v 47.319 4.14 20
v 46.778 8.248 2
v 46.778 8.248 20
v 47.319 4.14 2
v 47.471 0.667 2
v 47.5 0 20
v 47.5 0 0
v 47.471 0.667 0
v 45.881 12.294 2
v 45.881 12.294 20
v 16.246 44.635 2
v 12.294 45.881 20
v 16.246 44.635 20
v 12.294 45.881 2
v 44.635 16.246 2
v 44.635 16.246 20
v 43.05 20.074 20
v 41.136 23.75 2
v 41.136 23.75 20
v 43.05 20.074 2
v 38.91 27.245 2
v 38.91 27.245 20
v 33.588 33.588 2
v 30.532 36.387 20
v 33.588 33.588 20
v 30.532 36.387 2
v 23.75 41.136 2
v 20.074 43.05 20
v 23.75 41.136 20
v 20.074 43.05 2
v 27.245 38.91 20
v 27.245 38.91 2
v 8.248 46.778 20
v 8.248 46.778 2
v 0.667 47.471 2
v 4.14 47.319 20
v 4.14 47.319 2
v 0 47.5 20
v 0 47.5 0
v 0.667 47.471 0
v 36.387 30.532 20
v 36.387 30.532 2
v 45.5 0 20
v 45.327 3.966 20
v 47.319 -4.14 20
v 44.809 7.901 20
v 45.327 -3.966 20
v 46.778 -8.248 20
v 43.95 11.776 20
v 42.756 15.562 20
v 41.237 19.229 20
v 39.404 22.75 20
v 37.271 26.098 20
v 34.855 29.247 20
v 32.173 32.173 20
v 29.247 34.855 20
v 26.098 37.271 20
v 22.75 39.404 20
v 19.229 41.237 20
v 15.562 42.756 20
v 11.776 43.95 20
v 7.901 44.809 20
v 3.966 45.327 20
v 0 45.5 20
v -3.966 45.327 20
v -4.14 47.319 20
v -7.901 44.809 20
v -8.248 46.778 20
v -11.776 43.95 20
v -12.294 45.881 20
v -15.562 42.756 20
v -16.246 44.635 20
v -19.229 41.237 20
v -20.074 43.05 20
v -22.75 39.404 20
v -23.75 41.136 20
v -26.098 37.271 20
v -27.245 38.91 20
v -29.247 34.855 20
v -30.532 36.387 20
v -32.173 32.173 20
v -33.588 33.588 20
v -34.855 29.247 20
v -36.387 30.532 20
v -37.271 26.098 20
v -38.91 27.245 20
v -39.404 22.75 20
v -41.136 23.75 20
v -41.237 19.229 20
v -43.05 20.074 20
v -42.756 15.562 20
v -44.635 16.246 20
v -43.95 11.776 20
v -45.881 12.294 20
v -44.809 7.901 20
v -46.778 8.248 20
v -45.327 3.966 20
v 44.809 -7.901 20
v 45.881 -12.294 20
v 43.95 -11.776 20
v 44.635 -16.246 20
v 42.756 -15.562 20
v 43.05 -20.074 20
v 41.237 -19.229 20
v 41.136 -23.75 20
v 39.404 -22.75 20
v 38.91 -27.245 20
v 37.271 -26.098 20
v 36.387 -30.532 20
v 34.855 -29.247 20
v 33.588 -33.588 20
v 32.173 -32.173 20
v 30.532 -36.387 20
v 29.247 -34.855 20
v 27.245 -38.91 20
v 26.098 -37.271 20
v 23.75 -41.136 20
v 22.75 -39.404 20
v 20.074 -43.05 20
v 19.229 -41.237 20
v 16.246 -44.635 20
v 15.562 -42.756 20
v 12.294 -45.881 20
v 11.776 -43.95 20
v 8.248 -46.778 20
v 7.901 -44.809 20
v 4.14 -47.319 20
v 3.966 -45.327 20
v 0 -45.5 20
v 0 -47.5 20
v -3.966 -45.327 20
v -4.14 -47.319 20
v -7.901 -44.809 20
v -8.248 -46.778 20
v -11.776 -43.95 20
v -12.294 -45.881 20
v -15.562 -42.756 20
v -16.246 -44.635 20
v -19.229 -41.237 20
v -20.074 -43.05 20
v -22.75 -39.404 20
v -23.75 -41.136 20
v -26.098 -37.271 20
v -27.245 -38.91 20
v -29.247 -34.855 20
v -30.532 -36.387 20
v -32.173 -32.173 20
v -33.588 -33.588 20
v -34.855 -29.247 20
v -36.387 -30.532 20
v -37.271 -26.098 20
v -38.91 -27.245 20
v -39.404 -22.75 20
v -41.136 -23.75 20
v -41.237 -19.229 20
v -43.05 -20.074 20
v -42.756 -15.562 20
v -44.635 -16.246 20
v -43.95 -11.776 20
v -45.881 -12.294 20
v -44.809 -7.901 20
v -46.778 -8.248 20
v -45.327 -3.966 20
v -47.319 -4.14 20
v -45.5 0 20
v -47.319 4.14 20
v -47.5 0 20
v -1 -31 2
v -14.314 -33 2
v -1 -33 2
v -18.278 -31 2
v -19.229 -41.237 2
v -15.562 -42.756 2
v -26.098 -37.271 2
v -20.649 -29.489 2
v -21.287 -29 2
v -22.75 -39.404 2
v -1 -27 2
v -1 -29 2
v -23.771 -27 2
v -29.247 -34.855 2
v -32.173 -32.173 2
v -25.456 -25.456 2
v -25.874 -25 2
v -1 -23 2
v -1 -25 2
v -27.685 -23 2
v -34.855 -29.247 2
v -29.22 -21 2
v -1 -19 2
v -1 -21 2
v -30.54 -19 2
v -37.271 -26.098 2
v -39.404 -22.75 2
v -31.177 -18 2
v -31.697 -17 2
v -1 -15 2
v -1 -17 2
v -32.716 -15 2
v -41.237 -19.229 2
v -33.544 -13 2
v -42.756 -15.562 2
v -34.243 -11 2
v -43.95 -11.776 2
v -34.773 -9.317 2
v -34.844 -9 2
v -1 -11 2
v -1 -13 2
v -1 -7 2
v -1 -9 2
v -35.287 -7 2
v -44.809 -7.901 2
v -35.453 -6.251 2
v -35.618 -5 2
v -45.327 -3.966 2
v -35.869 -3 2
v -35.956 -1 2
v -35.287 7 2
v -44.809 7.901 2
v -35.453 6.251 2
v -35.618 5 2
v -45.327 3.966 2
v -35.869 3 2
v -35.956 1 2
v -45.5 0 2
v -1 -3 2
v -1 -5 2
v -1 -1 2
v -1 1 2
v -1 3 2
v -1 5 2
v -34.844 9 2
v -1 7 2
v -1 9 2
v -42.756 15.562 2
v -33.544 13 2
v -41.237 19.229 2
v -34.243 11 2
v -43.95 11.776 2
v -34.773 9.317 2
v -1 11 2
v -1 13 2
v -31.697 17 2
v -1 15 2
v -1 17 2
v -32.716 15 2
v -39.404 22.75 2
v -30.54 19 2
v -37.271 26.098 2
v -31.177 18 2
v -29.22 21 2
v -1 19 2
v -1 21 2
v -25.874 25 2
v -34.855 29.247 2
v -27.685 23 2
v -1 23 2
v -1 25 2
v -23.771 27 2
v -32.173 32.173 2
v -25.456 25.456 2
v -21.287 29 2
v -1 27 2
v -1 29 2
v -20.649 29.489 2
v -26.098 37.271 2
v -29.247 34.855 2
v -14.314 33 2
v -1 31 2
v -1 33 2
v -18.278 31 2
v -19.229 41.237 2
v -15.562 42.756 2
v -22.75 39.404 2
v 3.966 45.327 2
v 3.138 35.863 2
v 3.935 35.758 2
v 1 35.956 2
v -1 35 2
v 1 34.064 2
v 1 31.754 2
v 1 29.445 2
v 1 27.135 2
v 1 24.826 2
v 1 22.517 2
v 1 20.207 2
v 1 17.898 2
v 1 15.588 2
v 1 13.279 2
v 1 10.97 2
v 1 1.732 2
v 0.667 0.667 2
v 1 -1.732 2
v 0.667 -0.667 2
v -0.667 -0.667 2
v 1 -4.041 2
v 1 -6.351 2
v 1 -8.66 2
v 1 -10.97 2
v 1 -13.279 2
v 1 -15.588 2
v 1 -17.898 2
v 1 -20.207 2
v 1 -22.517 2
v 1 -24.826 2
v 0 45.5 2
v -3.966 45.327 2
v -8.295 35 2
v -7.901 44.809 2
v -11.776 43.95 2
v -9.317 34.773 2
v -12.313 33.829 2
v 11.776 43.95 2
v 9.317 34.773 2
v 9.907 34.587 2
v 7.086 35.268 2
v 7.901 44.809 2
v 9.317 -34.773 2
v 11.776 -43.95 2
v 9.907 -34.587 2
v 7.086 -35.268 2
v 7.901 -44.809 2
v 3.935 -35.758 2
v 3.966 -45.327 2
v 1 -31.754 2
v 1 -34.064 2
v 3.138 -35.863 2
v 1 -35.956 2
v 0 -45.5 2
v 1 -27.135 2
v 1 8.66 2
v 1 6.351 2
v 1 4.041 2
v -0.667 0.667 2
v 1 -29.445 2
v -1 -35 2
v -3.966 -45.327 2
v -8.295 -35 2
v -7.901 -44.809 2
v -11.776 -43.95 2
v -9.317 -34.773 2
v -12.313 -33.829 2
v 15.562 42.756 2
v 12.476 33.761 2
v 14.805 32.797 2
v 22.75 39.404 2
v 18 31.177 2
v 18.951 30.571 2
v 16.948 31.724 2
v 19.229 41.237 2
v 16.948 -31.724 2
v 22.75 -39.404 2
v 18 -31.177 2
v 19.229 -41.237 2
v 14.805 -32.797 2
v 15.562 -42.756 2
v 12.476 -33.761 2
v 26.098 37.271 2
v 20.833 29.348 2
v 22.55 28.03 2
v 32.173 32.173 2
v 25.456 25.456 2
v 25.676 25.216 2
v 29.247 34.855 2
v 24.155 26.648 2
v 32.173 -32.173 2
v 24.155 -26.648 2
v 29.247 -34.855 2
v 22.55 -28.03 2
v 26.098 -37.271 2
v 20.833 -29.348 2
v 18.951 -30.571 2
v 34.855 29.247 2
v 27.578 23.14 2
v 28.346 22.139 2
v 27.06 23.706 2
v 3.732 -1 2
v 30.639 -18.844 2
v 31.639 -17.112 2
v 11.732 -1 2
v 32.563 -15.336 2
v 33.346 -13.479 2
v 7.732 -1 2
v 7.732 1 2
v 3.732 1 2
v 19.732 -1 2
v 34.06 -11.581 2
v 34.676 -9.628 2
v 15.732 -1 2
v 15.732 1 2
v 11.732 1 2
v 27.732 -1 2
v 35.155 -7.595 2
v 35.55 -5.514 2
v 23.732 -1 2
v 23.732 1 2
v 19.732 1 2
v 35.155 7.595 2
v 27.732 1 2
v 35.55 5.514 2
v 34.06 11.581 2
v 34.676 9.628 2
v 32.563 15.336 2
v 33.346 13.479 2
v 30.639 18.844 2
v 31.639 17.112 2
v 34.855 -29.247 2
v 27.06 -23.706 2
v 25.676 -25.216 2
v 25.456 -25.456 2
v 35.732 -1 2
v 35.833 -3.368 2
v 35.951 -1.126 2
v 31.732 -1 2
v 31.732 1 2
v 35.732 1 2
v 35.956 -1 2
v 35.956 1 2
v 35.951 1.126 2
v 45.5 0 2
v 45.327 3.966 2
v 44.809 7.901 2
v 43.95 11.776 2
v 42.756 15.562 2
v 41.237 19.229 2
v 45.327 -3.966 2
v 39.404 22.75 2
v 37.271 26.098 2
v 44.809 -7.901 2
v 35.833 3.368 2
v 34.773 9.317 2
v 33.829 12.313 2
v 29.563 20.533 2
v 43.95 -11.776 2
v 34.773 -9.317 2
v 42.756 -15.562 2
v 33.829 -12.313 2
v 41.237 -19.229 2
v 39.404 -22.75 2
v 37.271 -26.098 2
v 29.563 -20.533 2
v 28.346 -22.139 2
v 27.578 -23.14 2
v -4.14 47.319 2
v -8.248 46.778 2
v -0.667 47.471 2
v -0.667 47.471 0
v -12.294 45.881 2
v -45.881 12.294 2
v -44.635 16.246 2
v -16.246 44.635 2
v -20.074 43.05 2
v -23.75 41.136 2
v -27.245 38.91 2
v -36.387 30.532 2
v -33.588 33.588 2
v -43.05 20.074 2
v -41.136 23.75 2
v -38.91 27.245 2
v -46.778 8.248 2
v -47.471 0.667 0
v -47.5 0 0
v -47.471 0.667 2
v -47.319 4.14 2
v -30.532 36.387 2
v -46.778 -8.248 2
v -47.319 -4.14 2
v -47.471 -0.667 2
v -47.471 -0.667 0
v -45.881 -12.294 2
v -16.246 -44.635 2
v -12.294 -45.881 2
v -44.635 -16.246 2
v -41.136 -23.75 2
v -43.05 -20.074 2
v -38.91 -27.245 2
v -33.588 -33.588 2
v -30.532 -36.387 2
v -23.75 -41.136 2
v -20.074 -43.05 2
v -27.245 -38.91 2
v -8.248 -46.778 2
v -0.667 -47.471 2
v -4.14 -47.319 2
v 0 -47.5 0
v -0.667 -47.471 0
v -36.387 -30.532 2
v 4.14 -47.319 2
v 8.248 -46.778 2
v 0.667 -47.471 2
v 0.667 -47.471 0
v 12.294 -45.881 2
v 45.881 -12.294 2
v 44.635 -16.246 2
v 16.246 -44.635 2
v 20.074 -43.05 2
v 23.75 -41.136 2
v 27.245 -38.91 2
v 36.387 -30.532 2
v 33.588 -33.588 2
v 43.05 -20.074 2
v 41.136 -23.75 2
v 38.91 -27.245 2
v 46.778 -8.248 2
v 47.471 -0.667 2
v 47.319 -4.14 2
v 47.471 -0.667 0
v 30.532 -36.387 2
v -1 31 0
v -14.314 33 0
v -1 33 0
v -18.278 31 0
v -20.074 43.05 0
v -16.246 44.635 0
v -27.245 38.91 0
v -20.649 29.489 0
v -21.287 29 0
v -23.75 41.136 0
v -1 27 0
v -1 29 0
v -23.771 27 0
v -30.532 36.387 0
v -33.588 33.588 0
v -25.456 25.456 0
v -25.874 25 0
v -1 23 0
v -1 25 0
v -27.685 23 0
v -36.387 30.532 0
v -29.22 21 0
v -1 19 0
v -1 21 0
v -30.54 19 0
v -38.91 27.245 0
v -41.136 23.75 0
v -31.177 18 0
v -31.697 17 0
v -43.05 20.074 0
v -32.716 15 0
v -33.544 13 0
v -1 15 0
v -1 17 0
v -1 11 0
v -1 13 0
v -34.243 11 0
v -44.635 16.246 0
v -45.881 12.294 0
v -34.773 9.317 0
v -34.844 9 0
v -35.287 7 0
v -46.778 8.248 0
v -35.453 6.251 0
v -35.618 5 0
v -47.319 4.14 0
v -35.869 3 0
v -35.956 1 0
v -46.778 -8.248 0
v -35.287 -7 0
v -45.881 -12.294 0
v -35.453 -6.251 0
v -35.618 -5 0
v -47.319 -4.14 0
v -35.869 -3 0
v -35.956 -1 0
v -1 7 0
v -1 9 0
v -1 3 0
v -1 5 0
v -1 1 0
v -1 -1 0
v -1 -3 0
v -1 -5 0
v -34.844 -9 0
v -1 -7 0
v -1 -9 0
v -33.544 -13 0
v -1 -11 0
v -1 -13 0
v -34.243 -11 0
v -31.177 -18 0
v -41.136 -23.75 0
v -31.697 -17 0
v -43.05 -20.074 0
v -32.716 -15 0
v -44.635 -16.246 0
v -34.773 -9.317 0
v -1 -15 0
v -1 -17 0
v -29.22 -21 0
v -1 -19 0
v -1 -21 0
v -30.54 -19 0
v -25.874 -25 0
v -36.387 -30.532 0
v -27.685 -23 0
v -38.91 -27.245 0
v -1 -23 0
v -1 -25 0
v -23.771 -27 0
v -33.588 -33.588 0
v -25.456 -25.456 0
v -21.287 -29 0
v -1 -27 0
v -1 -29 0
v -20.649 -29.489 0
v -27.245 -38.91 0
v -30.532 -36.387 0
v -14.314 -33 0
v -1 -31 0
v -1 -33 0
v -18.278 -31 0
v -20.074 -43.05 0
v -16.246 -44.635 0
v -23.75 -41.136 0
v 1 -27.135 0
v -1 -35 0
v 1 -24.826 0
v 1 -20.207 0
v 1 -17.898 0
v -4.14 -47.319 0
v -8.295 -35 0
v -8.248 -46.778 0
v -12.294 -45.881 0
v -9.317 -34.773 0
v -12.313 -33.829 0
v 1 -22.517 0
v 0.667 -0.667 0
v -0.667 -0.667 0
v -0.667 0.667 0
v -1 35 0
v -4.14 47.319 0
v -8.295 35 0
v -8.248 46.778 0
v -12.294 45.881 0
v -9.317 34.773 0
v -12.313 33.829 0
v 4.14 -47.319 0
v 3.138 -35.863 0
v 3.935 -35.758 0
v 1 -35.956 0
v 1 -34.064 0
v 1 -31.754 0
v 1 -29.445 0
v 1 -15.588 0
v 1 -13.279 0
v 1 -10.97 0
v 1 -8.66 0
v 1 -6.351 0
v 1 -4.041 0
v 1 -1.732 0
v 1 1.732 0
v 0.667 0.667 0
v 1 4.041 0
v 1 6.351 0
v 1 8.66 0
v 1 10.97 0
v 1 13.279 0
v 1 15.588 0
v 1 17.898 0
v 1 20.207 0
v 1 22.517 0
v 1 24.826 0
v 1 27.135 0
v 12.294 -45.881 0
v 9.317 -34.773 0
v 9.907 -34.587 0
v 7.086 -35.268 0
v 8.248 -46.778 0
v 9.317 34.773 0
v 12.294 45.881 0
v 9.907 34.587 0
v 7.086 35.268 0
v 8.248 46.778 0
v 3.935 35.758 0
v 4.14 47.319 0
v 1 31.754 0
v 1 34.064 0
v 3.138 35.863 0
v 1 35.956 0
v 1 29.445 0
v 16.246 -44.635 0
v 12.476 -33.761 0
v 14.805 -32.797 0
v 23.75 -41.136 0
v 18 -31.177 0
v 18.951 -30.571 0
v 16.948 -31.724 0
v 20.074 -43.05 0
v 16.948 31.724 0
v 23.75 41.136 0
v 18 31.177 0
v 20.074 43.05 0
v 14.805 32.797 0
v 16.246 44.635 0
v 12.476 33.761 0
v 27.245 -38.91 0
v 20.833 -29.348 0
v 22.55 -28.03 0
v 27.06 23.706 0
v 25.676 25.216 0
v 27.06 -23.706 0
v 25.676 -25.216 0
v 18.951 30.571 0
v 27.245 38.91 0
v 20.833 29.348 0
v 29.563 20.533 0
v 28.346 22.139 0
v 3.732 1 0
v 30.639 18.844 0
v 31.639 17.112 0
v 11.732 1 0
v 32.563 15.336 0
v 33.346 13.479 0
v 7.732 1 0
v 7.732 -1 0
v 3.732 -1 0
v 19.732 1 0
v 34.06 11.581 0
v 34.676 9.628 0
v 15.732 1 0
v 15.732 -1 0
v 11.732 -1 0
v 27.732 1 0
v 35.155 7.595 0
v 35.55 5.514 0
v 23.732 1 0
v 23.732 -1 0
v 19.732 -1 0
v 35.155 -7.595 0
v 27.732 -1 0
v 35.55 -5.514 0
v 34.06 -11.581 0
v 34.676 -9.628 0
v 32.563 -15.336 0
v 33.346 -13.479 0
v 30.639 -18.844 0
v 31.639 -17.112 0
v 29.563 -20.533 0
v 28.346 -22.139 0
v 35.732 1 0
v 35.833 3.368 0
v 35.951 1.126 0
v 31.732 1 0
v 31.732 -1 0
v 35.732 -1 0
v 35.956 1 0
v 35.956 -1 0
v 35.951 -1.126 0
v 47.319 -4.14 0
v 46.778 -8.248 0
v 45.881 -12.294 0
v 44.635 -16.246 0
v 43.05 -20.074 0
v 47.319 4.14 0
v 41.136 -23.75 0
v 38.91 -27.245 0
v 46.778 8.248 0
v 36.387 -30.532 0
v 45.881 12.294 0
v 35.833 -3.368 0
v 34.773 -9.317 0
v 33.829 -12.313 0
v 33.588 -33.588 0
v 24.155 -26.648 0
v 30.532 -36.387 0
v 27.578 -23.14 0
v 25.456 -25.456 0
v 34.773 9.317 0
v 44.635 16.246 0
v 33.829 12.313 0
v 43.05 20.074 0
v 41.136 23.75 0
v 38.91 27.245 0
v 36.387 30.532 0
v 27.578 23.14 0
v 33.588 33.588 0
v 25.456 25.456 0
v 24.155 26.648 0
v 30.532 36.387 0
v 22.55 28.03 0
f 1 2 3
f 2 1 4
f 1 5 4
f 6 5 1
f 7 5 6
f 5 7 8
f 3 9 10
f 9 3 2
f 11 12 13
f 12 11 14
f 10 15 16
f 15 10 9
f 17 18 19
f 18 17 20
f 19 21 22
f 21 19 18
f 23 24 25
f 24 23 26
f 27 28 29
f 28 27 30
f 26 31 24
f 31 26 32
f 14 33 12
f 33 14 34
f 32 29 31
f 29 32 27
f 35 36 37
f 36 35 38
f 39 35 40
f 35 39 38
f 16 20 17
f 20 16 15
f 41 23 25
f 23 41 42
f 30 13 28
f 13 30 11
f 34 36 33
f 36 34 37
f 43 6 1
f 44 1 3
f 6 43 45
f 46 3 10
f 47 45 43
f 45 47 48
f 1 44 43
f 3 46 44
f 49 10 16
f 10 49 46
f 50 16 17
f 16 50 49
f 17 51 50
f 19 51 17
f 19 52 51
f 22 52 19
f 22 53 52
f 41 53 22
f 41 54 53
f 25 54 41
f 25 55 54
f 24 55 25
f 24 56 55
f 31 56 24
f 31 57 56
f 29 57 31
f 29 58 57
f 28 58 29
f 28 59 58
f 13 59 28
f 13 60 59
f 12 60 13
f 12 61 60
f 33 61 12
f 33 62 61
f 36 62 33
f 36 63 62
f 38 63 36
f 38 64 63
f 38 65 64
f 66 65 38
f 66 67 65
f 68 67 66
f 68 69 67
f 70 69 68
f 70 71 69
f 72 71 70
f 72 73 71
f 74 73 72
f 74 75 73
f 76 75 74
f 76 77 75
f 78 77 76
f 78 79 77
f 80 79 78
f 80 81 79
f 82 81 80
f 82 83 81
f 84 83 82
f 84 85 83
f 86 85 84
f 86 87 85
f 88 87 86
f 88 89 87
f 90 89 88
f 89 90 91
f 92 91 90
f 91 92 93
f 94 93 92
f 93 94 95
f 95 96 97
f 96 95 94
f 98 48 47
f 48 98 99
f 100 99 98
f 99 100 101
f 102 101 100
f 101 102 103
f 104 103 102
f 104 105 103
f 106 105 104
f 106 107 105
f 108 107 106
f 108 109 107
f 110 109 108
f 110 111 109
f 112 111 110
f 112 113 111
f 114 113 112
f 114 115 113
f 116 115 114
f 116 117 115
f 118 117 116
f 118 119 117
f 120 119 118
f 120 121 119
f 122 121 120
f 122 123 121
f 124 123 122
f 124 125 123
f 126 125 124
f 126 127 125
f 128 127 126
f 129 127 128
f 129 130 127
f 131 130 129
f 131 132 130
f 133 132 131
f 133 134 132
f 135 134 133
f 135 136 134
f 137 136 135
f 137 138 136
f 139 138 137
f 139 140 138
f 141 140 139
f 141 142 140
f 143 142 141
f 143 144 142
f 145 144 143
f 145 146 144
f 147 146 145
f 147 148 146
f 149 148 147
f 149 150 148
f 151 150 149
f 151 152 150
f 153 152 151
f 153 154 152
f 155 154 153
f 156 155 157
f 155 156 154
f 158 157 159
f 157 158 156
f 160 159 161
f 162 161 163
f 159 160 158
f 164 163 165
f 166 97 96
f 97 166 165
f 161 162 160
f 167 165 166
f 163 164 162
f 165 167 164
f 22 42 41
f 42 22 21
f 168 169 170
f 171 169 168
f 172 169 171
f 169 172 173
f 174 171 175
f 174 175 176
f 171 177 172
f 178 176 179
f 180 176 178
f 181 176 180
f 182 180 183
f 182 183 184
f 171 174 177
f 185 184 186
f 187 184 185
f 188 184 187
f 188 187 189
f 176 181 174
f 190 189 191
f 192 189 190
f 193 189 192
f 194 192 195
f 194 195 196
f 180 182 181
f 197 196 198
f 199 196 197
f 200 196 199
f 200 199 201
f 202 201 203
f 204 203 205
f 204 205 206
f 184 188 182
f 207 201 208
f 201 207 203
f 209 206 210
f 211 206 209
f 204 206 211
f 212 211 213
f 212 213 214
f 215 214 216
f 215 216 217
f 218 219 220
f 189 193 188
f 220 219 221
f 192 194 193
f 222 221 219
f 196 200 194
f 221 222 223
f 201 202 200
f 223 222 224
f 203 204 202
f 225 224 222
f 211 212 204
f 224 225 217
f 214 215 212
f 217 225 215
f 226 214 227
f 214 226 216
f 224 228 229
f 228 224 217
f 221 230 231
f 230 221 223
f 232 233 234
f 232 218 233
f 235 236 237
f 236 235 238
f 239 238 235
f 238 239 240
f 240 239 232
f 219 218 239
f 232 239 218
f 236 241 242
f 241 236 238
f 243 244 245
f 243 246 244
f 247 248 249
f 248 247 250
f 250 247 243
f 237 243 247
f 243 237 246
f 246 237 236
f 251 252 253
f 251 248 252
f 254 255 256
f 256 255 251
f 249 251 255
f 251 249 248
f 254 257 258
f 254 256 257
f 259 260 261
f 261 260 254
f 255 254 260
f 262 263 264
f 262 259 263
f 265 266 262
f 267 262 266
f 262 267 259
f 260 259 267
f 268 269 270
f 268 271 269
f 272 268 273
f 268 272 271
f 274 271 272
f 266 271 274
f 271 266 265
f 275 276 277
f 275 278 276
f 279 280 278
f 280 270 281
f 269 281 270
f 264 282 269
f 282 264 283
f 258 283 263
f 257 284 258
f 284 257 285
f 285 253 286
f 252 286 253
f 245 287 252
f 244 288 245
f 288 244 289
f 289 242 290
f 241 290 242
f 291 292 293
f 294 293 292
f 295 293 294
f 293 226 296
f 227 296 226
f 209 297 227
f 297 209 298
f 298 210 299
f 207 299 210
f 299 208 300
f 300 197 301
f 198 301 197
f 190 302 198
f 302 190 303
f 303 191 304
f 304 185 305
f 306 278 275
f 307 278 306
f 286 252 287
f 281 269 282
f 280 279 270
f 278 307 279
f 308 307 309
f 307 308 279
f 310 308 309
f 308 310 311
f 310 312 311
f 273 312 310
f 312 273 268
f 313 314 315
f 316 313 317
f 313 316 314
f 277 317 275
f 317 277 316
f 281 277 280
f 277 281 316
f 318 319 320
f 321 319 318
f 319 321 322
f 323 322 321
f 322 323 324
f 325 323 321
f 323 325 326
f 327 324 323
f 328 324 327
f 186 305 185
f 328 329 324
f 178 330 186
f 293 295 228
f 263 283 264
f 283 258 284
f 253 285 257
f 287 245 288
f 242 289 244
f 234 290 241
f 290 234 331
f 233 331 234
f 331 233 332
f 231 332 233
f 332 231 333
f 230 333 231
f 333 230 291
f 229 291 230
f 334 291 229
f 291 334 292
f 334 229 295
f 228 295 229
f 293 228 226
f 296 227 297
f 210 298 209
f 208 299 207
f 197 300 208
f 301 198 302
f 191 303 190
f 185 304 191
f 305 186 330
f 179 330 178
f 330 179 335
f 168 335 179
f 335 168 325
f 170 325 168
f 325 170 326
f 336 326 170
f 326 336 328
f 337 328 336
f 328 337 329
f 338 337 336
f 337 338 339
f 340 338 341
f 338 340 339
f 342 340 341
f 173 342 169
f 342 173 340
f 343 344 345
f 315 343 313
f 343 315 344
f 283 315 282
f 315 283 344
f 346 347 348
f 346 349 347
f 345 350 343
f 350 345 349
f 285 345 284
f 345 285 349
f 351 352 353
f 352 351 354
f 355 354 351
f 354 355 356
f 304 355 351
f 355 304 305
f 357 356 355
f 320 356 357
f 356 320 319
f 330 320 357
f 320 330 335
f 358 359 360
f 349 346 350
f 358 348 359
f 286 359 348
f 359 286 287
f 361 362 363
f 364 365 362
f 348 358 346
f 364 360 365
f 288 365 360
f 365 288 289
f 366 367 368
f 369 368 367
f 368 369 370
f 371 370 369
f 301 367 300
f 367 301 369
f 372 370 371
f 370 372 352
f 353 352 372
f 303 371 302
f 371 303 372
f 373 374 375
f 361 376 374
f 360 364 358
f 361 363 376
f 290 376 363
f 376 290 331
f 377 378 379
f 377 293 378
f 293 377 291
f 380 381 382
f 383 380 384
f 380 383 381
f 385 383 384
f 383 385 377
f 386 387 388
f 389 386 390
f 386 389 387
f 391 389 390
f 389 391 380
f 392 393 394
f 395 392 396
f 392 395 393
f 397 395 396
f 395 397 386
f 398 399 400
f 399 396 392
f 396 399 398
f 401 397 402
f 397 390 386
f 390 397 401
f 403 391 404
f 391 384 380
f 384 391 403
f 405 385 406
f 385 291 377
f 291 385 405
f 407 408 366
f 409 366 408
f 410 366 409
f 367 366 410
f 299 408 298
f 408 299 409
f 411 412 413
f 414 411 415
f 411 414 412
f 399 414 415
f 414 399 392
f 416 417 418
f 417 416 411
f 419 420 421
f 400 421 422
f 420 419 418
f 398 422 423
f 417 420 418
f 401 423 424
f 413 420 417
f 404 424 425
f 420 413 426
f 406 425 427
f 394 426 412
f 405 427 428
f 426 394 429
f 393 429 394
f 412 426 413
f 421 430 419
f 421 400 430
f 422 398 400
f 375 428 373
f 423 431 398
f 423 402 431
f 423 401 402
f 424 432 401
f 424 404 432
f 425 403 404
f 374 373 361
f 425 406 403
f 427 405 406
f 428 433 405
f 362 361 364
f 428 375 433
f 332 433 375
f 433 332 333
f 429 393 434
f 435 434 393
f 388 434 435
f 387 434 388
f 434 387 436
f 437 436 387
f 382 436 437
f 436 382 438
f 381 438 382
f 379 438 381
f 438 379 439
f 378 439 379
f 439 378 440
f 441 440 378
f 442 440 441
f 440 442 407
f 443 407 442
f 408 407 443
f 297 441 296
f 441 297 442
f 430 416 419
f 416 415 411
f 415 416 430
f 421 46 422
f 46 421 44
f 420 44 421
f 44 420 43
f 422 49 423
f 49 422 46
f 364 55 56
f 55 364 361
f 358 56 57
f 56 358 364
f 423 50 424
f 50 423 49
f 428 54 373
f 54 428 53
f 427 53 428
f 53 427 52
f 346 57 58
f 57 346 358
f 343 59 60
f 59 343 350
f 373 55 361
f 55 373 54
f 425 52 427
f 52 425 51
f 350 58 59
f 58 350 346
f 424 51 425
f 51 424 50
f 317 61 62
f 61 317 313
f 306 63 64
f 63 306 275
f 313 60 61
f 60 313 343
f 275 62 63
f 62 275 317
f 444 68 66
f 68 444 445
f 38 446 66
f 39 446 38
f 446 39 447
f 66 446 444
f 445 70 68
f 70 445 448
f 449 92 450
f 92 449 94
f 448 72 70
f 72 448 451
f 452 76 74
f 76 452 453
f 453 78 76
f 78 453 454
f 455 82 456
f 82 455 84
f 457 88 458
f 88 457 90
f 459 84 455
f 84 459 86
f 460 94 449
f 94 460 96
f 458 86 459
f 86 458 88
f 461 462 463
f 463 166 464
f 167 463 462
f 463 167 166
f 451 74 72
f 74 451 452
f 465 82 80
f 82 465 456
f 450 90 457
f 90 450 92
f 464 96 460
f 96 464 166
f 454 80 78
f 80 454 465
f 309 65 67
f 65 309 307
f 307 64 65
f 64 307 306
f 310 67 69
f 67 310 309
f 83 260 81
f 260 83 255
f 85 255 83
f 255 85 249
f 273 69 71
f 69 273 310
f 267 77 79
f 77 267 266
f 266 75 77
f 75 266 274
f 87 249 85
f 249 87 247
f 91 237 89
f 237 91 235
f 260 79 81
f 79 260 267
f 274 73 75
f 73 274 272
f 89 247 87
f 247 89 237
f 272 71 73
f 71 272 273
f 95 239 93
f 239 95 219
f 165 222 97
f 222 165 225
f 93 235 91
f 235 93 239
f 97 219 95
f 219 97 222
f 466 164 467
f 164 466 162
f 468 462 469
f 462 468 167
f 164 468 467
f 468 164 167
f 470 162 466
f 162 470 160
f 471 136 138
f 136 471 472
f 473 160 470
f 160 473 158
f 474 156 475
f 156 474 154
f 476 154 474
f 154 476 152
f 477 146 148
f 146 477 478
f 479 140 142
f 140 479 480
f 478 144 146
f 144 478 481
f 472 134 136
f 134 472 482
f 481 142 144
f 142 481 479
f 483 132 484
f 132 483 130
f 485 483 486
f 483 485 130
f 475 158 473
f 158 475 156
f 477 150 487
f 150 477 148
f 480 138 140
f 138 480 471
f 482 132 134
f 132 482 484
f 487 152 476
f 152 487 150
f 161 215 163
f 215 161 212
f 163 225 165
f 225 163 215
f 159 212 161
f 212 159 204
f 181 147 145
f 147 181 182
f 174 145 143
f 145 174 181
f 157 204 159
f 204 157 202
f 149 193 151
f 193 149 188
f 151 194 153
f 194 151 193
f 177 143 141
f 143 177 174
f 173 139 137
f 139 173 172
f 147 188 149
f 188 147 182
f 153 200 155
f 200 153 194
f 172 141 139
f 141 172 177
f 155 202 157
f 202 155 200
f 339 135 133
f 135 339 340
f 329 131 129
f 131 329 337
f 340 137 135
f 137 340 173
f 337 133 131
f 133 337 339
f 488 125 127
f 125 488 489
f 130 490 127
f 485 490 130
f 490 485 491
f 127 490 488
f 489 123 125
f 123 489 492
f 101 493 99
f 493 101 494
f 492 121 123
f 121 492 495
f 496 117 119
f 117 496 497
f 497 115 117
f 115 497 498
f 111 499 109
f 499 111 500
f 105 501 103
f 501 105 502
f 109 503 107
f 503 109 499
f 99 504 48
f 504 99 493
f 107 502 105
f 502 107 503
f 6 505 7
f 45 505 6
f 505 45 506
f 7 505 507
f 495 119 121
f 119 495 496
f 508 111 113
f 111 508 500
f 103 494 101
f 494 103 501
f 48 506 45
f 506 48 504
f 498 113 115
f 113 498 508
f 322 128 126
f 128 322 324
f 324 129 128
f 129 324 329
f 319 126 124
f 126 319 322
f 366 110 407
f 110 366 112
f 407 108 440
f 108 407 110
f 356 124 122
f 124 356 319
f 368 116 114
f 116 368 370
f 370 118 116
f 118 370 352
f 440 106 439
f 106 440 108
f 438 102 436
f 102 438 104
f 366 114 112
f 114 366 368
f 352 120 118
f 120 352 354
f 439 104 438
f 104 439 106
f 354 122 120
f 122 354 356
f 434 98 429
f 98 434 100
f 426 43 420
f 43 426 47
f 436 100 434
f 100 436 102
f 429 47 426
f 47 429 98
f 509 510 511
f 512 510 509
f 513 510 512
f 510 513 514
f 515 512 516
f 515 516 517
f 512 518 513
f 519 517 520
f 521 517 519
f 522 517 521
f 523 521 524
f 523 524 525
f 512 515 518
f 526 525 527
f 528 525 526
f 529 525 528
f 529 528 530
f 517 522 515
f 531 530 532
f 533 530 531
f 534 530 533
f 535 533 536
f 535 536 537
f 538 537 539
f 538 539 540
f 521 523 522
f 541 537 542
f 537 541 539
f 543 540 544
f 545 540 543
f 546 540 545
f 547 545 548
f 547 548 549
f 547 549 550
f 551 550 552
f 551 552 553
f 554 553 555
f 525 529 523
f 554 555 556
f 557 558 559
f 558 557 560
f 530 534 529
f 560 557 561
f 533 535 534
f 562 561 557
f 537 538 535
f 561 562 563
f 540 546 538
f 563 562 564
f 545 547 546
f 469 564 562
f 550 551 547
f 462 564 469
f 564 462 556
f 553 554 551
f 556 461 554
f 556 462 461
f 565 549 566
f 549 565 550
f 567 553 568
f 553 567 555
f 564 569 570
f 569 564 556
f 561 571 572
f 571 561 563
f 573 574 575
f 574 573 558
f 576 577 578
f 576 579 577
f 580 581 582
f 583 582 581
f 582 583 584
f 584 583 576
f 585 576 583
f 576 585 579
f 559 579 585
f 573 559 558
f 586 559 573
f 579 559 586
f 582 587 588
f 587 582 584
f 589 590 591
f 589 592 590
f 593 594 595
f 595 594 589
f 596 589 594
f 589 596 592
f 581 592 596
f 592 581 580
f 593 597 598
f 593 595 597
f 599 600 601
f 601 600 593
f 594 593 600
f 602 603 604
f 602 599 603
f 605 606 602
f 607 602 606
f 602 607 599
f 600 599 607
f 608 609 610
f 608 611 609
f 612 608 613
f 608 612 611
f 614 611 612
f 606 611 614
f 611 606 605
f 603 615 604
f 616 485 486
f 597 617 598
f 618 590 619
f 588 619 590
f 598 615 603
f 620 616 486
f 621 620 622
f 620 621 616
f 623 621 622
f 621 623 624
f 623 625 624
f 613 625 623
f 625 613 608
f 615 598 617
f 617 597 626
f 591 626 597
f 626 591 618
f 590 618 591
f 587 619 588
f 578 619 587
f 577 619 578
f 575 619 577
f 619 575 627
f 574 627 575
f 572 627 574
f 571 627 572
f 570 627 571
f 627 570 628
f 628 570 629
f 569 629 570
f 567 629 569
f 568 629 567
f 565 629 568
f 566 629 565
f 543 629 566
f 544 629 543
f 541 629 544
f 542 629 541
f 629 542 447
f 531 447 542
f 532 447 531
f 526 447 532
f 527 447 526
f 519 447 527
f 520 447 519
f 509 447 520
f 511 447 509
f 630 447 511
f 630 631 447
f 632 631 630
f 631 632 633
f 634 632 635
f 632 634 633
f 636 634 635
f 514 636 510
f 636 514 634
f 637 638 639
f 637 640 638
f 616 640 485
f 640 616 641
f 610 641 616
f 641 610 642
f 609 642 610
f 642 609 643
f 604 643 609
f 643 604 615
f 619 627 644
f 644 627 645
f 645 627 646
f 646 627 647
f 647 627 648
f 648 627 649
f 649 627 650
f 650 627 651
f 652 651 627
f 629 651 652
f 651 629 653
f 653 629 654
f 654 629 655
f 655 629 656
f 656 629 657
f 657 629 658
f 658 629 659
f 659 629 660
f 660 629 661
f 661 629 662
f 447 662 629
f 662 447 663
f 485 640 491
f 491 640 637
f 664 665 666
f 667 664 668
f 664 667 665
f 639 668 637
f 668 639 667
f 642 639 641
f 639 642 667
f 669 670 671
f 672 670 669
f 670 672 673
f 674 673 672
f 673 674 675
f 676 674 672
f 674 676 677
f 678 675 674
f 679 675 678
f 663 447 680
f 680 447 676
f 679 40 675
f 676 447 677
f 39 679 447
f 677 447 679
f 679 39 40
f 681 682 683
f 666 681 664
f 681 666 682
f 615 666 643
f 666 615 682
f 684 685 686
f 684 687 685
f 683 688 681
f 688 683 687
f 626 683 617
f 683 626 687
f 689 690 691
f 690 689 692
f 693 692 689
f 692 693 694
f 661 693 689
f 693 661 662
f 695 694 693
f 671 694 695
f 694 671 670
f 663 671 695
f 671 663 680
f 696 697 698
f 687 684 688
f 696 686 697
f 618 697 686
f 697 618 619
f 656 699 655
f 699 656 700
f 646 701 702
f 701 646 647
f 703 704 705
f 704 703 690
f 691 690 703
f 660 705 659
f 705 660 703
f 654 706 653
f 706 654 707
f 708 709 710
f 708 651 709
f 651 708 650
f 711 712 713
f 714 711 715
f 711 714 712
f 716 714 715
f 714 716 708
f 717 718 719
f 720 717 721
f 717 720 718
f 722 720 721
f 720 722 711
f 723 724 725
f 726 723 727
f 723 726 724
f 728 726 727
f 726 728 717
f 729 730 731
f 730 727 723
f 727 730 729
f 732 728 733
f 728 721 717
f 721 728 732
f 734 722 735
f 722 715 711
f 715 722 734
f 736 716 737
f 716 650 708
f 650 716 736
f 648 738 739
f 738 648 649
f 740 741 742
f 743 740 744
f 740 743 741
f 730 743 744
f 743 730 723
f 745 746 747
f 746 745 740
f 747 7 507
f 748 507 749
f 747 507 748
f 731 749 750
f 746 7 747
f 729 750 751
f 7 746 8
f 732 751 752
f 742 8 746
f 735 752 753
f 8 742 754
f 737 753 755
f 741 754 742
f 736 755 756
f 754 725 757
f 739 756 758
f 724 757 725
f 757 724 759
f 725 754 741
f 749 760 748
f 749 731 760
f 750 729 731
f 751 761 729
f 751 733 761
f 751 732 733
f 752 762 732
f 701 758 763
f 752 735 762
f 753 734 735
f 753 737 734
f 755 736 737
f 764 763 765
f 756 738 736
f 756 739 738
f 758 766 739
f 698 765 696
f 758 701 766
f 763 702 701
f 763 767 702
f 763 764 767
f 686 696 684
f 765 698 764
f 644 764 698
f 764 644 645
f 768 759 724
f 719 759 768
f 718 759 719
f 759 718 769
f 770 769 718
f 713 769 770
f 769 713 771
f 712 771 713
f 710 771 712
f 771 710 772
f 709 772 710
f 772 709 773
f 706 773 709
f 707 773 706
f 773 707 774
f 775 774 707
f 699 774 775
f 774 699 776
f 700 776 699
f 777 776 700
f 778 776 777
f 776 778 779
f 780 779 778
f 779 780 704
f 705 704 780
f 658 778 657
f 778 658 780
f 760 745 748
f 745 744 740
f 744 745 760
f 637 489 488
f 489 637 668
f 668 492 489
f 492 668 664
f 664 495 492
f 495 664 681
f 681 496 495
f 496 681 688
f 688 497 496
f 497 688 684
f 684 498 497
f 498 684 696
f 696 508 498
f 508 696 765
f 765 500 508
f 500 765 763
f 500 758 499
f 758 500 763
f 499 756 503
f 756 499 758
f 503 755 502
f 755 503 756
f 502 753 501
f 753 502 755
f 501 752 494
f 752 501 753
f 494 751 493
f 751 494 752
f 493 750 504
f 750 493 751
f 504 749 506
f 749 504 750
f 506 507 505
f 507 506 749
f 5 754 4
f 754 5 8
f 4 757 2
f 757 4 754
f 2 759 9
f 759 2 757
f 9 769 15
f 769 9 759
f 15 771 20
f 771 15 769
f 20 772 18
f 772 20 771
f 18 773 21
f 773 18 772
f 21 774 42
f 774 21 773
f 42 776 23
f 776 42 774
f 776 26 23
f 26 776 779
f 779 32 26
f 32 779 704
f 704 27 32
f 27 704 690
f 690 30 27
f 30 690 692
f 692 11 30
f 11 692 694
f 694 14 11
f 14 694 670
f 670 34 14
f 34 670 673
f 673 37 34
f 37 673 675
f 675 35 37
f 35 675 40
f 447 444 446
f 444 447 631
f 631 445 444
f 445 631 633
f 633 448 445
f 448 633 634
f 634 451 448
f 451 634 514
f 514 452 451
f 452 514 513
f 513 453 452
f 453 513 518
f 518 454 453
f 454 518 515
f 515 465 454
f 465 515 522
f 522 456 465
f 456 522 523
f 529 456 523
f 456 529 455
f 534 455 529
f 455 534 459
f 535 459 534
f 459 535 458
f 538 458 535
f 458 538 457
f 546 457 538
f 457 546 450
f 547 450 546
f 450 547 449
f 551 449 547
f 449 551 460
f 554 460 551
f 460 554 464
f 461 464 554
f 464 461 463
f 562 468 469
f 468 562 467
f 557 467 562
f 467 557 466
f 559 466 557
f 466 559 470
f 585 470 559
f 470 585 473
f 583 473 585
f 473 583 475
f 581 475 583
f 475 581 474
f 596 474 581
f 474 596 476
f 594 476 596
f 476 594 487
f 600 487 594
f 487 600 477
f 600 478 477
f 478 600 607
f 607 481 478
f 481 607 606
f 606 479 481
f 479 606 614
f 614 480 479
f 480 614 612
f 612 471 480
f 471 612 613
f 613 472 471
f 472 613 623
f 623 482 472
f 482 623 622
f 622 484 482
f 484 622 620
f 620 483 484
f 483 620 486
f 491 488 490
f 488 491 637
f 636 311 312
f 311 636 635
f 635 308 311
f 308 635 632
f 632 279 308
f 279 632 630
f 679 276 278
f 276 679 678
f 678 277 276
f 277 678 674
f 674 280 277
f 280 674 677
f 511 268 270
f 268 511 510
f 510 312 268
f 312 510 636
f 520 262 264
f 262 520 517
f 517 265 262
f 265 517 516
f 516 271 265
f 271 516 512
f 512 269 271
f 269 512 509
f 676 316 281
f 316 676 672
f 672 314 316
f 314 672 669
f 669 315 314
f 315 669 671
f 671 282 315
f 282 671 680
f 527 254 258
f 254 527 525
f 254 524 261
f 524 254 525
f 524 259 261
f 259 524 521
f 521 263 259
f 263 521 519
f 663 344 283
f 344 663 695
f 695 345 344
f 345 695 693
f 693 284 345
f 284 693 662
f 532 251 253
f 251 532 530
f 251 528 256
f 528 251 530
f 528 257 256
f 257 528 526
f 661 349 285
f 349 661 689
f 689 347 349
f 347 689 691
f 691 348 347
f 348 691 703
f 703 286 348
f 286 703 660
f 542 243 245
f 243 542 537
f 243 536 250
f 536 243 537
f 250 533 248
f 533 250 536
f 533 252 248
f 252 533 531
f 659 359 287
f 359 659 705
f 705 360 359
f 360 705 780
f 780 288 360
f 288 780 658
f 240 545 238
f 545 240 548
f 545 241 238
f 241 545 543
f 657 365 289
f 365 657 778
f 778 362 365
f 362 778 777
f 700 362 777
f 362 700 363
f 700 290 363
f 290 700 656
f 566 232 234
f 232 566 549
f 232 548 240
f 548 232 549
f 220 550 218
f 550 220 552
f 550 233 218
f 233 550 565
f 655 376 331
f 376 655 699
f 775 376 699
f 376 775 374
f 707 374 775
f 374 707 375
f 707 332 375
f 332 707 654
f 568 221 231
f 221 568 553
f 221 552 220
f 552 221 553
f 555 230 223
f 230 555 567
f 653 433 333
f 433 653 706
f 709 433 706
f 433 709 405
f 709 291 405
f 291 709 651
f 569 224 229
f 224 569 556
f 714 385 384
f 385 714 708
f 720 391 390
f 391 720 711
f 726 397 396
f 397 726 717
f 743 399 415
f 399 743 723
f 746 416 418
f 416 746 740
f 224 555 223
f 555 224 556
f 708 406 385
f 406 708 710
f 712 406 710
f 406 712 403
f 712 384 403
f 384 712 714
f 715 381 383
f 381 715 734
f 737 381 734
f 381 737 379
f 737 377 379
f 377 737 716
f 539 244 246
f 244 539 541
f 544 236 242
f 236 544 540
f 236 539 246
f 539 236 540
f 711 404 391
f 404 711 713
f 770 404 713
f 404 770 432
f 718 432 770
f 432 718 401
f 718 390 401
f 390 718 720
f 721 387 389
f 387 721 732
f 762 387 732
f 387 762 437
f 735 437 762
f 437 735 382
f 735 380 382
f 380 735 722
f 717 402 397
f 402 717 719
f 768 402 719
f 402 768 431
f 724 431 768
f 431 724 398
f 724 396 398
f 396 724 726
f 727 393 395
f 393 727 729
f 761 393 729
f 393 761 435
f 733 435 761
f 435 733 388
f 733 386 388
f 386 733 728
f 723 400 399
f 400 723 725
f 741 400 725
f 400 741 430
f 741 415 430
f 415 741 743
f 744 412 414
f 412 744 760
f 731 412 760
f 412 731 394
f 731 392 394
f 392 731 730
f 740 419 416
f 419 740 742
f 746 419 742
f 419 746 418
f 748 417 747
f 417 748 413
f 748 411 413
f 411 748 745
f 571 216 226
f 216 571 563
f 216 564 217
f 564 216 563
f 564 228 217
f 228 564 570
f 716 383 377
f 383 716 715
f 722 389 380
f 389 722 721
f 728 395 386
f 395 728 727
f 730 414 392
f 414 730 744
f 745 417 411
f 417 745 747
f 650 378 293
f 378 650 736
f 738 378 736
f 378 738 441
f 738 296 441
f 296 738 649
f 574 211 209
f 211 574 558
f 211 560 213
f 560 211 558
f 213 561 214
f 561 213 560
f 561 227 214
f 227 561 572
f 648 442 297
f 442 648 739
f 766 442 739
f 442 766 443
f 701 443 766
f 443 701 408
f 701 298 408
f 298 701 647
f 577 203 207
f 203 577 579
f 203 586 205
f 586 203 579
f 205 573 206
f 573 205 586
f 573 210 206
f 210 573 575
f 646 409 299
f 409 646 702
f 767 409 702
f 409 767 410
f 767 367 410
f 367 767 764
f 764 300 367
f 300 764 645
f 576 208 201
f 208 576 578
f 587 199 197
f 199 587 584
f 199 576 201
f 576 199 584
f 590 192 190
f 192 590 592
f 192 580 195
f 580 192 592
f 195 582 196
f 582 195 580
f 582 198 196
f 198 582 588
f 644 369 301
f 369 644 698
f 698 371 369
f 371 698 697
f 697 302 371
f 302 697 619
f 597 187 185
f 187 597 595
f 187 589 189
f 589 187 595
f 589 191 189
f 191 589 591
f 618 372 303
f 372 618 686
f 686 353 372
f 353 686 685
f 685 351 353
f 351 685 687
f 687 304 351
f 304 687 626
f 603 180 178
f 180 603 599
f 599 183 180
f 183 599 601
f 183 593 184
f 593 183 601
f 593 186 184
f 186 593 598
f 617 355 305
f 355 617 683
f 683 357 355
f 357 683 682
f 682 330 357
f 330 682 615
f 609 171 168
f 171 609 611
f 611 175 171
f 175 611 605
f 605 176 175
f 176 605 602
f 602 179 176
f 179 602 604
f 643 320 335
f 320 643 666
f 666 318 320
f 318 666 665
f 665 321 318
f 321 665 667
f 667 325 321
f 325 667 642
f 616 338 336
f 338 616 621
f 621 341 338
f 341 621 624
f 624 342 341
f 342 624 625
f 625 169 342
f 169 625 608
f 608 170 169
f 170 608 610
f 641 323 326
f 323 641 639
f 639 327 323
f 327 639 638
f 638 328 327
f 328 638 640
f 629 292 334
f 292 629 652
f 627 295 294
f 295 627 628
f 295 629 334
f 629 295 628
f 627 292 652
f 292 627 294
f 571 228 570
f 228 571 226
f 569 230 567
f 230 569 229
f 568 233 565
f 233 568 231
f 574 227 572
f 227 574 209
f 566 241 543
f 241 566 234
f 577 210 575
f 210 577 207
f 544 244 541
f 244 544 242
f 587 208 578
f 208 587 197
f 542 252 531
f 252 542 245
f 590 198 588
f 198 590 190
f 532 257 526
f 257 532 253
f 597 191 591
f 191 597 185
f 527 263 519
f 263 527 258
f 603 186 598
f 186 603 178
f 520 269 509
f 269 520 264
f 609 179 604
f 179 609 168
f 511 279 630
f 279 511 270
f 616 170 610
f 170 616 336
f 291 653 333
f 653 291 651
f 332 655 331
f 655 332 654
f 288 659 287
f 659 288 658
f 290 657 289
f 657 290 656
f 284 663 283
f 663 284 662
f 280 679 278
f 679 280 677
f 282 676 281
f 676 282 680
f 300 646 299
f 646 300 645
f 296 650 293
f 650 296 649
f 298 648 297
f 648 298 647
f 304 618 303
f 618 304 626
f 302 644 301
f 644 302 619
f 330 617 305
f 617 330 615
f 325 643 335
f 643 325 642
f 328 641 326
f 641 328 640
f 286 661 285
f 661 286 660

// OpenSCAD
/*                                                
 * A Bahtinov mask generator.
 * Units in mm, default values are for
 * a Samyang 135mm F/2.0 lens.
 *
 * Copyright 2017, Andreas Dietz
 * License: CC-BY-SA
 *
 * Based on the work by Ella Astashonok
 *
 * Original design by Brent Burton
 * ver. 2.1.0
 */

/* [primary] */

// The telescope focus length 
focus = 1500; // [10:1000] // SkyMax 127
focus = 420; // [10:1000] // EvoStar 72ED

// The telescope light's path diameter.
aperture = 127; // [30:200] // SkyMax 127
aperture = 72; // [30:200] // EvoStar 72ED

// This is the inner diameter of the mask.
inner_Diameter = 146; // [31:250] // SkyMax 127
inner_Diameter = 91 ; // [31:250] // EvoStar 72ED

// Height of mask
mask_Height = 2; // [1:10]

// Diameter of secondary mirror holder. If no secondary, set to 0.
center_Hole_Diameter = 0; // [0:90]

// Height of outer border
outer_Height = 20; // [0:50]

//Inner border around center hole. Can be used as handle. 0 for no border. Negative values generate border on oposite side. Not recomended - hard to print. 
inner_Height = 0; // [-50:+50] 

// Split 4 parts distance (-1 for one pice mask)
split_Distance = -1; //[-1:20]

/* [Advanced] */

//Select part to print
part = "all"; //[tl:Top Left, tr:Top Right, bl:Bottom Left, br:Bottom Right, all: All parts]

// Bahtinov factor used for calculate slot size. (should be from 150 to 200. You shouldn't need to tweak this unless your slots are too narrow for printing, in which case, divide the factor by 3)
bahtinov_factor = 50; // [50:200] 

// Width of the gaps and the bars (0-for auto calculate).
slot_Size = 2; // [0:10]

// Width of central bars (0 foor same as bars and gaps)
central_bars_width = 0; //[0:20]

// Angle of slots
slots_Orientation = 30; // [20:45]

// Layer size used to calculate separation distance when making splitted mask
split_layer_width = 0.3;


outerDiameter = inner_Diameter + 2 * mask_Height;
maskHeight=mask_Height;
outerHeight=outer_Height;
handle = inner_Height;
bahtinov = bahtinov_factor;
slotSize = slot_Size;
slotsOrientation = slots_Orientation;
central_bars = central_bars_width;
split_layer = split_layer_width;

layer = split_Distance >= 0 || part != "all" ? split_layer : 0;
gap = slotSize > layer*2 ? slotSize : getGap(focus, bahtinov) < layer*2 ? getGap(focus, bahtinov / 3)  : getGap(focus, bahtinov);
cBars1 = central_bars > 0 ? (central_bars > gap ? central_bars : gap) : gap;
cBars = cBars1 > layer*5 || split_Distance < 0 ? cBars1 : layer*5;
centerHoleDiameter = center_Hole_Diameter > 0 && center_Hole_Diameter < cBars ? cBars : center_Hole_Diameter;
splitDistance = split_Distance > 0 && split_Distance < cBars ? cBars : split_Distance;
split = part != "all" && splitDistance < cBars*2 ? cBars*2 : (splitDistance < 0 ? 0 : splitDistance); 
//split = splitDistance < 0 ? 0 : splitDistance;
handleHeight = abs(handle);
echo("Gap size: ", gap);	

print_main(part);

function getGap(focus, bahtinov) = round(focus/bahtinov*100+0.5)/200;

/* create a series of bars covering roughly one half of the
 * scope aperture. Located in the +X side.
 */
module bars(gap, width, num=5, split) {
    num = round(num);
    for (i=[-num:0]) {
        translate([width/2+split,i*2*gap-split+gap]) square([width,gap], center=true);
    }
    for (i=[0:num]) {
        translate([width/2+split,i*2*gap+split+gap]) square([width,gap], center=true);
    }
}

module bahtinovBars(gap,width, split) {
    numBars = round(aperture/2 / gap / 2 + 0.5);
    // +X +Y bars
	 translate([split, split, 0]) 
	 intersection() {
		rotate([0,0,slotsOrientation]) bars(gap, width, numBars, 0);
		square([outerDiameter/2, outerDiameter/2], center=false);
	 }
	 // +X -Y bars
	 translate([split, -split, 0]) 
	 intersection() {
		rotate([0,0,-slotsOrientation]) bars(gap, width, numBars, 0);
		translate([0,-outerDiameter/2]) square([outerDiameter/2, outerDiameter/2], center=false);
	 }
	 // -X bars
	 rotate([0,0,180]) bars(gap, width, numBars, split);
}

$fn=72;
module bahtinov2D() {
    width = aperture/2+1;
    difference() {                          // overall plate minus center hole
        union() {
				difference(){							  // trims the mask to aperture size
					
					for( pos = [0:3]){
							rotate([0, 0, pos*90]) 
								translate([split, split]) 
									circle(r=aperture/2+1);
					}
	            bahtinovBars(gap,width, split);
				}
            
				for( pos = [0:90:359]){
					rotate([0, 0, pos]) 
						translate([split, split])
							intersection(){ 
								difference() {                  // makes the outer margin
	            				circle(r=outerDiameter/2);
	            				circle(r=aperture/2);
	            			}
								translate([0,layer/2,0]) square([outerDiameter/2, outerDiameter/2]);
							}
				}

            // Add center hole margin if needed:
				
            if (centerHoleDiameter > 0) {
					for(i = [0:90:359])
						rotate([0,0,i])
							translate([split, split])
                			intersection(){
									circle(r=(centerHoleDiameter+gap)/2);
									square([centerHoleDiameter/2+gap, centerHoleDiameter/2+gap]);
								}
            }
				

        	}//union
        	
         // Add center hole if needed:
			if (centerHoleDiameter > 0) {
				for(i = [0:90:359])
					rotate([0,0,i]){
	               intersection(){
							translate([split, split])
								circle(r=centerHoleDiameter/2);
							square([centerHoleDiameter/2+split,centerHoleDiameter/2+split]);
						}
					}
			}

		}//difference
      
}

module fakeMask(){
	for(i=[0:90:359]){
		rotate([0,0,i])		
			intersection(){
				translate([split,split,0])
					difference(){
						cylinder(r=outerDiameter/2, h=maskHeight);
						translate([0,0,-1])cylinder(r=centerHoleDiameter/2, h=maskHeight+2);
					}
				cube([outerDiameter/2+split,outerDiameter/2+split,maskHeight]);
			}
	}
}

module triangleX(x, y, z){
		translate([0, y/2,0])
       rotate([90,0,0])
			linear_extrude(height=y) polygon(points=[[0, 0],[x, 0],[0, z]], path=[[0,1,2]]);
}

module connector(width, height, depth, layer){
	w1 = width*3/2-layer*2;
	w2 = width/2-layer*2;
	h = height;
	translate([0,0,-depth/2])
		linear_extrude(height=depth)
			polygon(points=[[-w1/2, h/2], [w1/2, h/2], [w2/2, -h/2], [-w2/2, -h/2]], path=[0,1,2,3]);
}

module horisontalSplit(length,height,depth,connector_width,split){
		// Add split structural bars
		bar_hgt = height / 6;
		connector_hgt = height*2/3;
		union(){
			//%cube([cBars,layer,3],true);
			difference(){
				union(){
					translate([split+length/2,(split-bar_hgt/2+height/2), 0]) //bar1
						cube([length, bar_hgt, depth], true);
					translate([split+length/2, -(split-bar_hgt/2+height/2), 0]) //bar2
						cube([length, bar_hgt, depth], true);
				}
				if(centerHoleDiameter<=0)
					translate([split,0,-1]) //bar2
						cube([height*2/3, split*2+height, depth+2], true);
				else
					union(){
						translate([split-centerHoleDiameter/2+gap/2,split,-depth/2-1]) //bar2
							cylinder(r=centerHoleDiameter/2, h=depth+2);
						translate([split-centerHoleDiameter/2+gap/2,-split,-depth/2-1]) //bar2
							cylinder(r=centerHoleDiameter/2, h=depth+2);
					}
			}
			intersection(){
				for(i=[connector_width*3/2-bar_hgt*3:connector_width*2:length+connector_width]){
					translate([i+split,-(split-connector_hgt/2+height/2-bar_hgt+layer),0])
						connector(connector_width-layer/2, connector_hgt, depth, layer);
					//if(i+connector_width*2 <= length+connector_width*2/3) 
					translate([i+split+connector_width,split-connector_hgt/2+height/2-bar_hgt+layer,0])
					rotate([0,0,180])
						connector(connector_width-layer/2, connector_hgt, depth, layer); 
				}
				translate([split+length/2/*+height/2-bar_hgt-layer*/, 0, 0])
					cube([length, split*2+height, depth], true);
				
			}
		}
	
}

module cylinderLocks(dOut,dIn,w,lock_h,layer,split){
	//Making outer border lock
	assign(wall = (dOut-dIn)/2)
 		for(i=[0:90:359]){ //outer lock
	 		rotate([0,0,i])
	   	translate([split,split,0]){
				intersection(){ //OuterLock
					difference(){ 
						cylinder (r=dOut/2, h=lock_h); //Outer wall 
						cylinder (r=dOut/2-(wall/2)+layer/2, h=lock_h); //Inner wall
	    			}
					translate([0,-w/3+layer,0])
						cube([dOut/2,w*2/3-layer,lock_h]);
				}
				rotate([0,0,90])
				intersection(){ //InterLock
					difference(){ 
						cylinder (r=dOut/2-(wall/2)-layer/2, h=lock_h); //Outer wall 
						cylinder (r=dIn/2, h=lock_h); //Inner wall
	    			}
					translate([0,-w/3,0])
						cube([dOut/2,w*2/3-layer,lock_h]);
			}
		}
 }
}

module print_main(part="all"){
	echo ("Printing part:", part);

	translate([part!="all"?(outerDiameter/4+split/2):0,part!="all"?(outerDiameter/4+split/2):0,0])
	rotate([0,0,part=="tl"?90:part=="tr"?180:part=="br"?-90:0])
	intersection(){
		union() {
		difference(){
		union() {
			
		    linear_extrude(height=maskHeight) bahtinov2D();
			 //fakeMask();

			 //Outer Border
		    if(outerHeight > 0){
			 	for(i=[0:90:359]){
					rotate([0,0,i])
					  translate([split,split,maskHeight]){
							difference(){
								intersection(){
						    		union(){
										difference(){ 
											cylinder (r=outerDiameter/2, h=outerHeight-maskHeight); //Outer wall 
											translate([0,0,-1])
												cylinder (r=outerDiameter/2-(maskHeight), h=outerHeight-maskHeight+2); //Inner wall
						    			}
									}
									cube([outerDiameter/2,outerDiameter/2,outerHeight-maskHeight]); 
								}
							}
					  }
				}
			 }
			 
			 //Inner border / handle
			 assign(ht=handle<0?handleHeight:handleHeight-maskHeight)
		    if(handleHeight > 0){
				if (centerHoleDiameter > 0){
					translate([0,0,handle<0?handle-maskHeight:0])
					union(){
						for(i=[0:90:395]){
							rotate([0,0,i])
							  translate([split,split,maskHeight]){
									difference(){
										intersection(){
							    			difference(){ 
												cylinder (r=(centerHoleDiameter+gap)/2, h=ht); //Outer wall 
												translate([0,0,-1])
													cylinder (r=(centerHoleDiameter)/2, h=ht+2); //Inner wall
							    			}
											//translate([0,0,0])
											cube([centerHoleDiameter/2+gap/2,centerHoleDiameter/2+gap,ht]); 
										}
									}
							  }
						}
					}//union
				}//holeDiameter > 0
			 }//Handle

		}//union
			//Split parts
			assign(maxpl= max(outerHeight,maskHeight,handle>0?handle:0))
			assign(maxh = max(maskHeight, handleHeight, outerHeight, maxpl-handle))
			{
				echo("maxh:",maxh," maxpl:",maxpl," handle:",handle);
				translate([0,0,(handle<0?(maxpl+handle)/2:maxpl/2)]){//(maxh/2)*sign(handle)+(handle<0?maskHeight:0)]){
					cube([outerDiameter+split*2,cBars*2/3+split*2,maxh+2],true);		
					cube([cBars*2/3+split*2,outerDiameter+split*2,maxh+2],true);
				}
			}		
		}//difference
			 //Make connectors
			 assign(
				con_delta = (centerHoleDiameter > 0 ? (centerHoleDiameter)/2-(cBars/4-cBars/12) : 0),
				con_length=outerDiameter/2-(centerHoleDiameter > 0 ? (centerHoleDiameter)/2 : 0)
			 )
			 for(i=[0:90:359]){
				rotate([0,0,i])
					intersection(){
						difference(){
							translate([con_delta,0,maskHeight/2]){						
								if(splitDistance>=0 || part != "all")
									horisontalSplit(con_length, cBars, maskHeight, cBars, split);
								else
									translate([con_length/2,0,0])
										cube([con_length, cBars,maskHeight],true);

							}
							intersection(){
								union(){
									translate([split,split,-1])
										cylinder(r=(centerHoleDiameter+gap)/2+layer, h=maskHeight+2);
									translate([split,-split,-1])
										cylinder(r=(centerHoleDiameter+gap)/2+layer, h=maskHeight+2);
								}
								translate([split+outerDiameter/4,0,maskHeight/2])
									cube([outerDiameter/2,cBars*2/3+split*2,maskHeight+2],true);
							}
						}
						union(){
							translate([split,split,-1])	
								cylinder(r=outerDiameter/2-maskHeight-layer, h=maskHeight+2);
							translate([split,-split,-1])	
								cylinder(r=outerDiameter/2-maskHeight-layer, h=maskHeight+2);
						}
					}
			 }

			 //Making outer border lock
			 cylinderLocks(outerDiameter,outerDiameter-maskHeight*2,cBars,outerHeight > 0 ? outerHeight : maskHeight,layer,split);

			 //Making inner border lock
			 if(centerHoleDiameter > 0)
				assign(ht=handle<0?handleHeight:handleHeight-maskHeight)
				translate([0,0,handle<0?handle:0])
					assign(h=handle != 0 ? (maskHeight+(handle>0?handleHeight-maskHeight:handleHeight)) : maskHeight)
			 		cylinderLocks(centerHoleDiameter+gap,centerHoleDiameter,cBars,h,layer,split);
			
		}//union
		if (part != "all"){
			if (part == "tl"){
				translate([-(outerDiameter/2+1+split),0,handle < 0 ? handle : 0])
					cube([outerDiameter/2+1+split,outerDiameter/2+1+split,maskHeight+max(handleHeight, outerHeight, outerHeight-handle)]);
			}
			if (part == "tr"){
				translate([0,0,handle < 0 ? handle : 0])
					cube([outerDiameter/2+1+split,outerDiameter/2+1+split,maskHeight+max(handleHeight, outerHeight, outerHeight-handle)]);
			}
			if (part == "bl"){
				translate([-(outerDiameter/2+1+split),-(outerDiameter/2+1+split),handle < 0 ? handle : 0])
					cube([outerDiameter/2+1+split,outerDiameter/2+1+split,maskHeight+max(handleHeight, outerHeight, outerHeight-handle)]);			
			}
			if (part == "br"){
				translate([0,-(outerDiameter/2+1+split),handle < 0 ? handle : 0])
					cube([outerDiameter/2+1+split,outerDiameter/2+1+split,maskHeight+max(handleHeight, outerHeight, outerHeight-handle)]);
			}
			
		}
	}//intersection

}//main_print
